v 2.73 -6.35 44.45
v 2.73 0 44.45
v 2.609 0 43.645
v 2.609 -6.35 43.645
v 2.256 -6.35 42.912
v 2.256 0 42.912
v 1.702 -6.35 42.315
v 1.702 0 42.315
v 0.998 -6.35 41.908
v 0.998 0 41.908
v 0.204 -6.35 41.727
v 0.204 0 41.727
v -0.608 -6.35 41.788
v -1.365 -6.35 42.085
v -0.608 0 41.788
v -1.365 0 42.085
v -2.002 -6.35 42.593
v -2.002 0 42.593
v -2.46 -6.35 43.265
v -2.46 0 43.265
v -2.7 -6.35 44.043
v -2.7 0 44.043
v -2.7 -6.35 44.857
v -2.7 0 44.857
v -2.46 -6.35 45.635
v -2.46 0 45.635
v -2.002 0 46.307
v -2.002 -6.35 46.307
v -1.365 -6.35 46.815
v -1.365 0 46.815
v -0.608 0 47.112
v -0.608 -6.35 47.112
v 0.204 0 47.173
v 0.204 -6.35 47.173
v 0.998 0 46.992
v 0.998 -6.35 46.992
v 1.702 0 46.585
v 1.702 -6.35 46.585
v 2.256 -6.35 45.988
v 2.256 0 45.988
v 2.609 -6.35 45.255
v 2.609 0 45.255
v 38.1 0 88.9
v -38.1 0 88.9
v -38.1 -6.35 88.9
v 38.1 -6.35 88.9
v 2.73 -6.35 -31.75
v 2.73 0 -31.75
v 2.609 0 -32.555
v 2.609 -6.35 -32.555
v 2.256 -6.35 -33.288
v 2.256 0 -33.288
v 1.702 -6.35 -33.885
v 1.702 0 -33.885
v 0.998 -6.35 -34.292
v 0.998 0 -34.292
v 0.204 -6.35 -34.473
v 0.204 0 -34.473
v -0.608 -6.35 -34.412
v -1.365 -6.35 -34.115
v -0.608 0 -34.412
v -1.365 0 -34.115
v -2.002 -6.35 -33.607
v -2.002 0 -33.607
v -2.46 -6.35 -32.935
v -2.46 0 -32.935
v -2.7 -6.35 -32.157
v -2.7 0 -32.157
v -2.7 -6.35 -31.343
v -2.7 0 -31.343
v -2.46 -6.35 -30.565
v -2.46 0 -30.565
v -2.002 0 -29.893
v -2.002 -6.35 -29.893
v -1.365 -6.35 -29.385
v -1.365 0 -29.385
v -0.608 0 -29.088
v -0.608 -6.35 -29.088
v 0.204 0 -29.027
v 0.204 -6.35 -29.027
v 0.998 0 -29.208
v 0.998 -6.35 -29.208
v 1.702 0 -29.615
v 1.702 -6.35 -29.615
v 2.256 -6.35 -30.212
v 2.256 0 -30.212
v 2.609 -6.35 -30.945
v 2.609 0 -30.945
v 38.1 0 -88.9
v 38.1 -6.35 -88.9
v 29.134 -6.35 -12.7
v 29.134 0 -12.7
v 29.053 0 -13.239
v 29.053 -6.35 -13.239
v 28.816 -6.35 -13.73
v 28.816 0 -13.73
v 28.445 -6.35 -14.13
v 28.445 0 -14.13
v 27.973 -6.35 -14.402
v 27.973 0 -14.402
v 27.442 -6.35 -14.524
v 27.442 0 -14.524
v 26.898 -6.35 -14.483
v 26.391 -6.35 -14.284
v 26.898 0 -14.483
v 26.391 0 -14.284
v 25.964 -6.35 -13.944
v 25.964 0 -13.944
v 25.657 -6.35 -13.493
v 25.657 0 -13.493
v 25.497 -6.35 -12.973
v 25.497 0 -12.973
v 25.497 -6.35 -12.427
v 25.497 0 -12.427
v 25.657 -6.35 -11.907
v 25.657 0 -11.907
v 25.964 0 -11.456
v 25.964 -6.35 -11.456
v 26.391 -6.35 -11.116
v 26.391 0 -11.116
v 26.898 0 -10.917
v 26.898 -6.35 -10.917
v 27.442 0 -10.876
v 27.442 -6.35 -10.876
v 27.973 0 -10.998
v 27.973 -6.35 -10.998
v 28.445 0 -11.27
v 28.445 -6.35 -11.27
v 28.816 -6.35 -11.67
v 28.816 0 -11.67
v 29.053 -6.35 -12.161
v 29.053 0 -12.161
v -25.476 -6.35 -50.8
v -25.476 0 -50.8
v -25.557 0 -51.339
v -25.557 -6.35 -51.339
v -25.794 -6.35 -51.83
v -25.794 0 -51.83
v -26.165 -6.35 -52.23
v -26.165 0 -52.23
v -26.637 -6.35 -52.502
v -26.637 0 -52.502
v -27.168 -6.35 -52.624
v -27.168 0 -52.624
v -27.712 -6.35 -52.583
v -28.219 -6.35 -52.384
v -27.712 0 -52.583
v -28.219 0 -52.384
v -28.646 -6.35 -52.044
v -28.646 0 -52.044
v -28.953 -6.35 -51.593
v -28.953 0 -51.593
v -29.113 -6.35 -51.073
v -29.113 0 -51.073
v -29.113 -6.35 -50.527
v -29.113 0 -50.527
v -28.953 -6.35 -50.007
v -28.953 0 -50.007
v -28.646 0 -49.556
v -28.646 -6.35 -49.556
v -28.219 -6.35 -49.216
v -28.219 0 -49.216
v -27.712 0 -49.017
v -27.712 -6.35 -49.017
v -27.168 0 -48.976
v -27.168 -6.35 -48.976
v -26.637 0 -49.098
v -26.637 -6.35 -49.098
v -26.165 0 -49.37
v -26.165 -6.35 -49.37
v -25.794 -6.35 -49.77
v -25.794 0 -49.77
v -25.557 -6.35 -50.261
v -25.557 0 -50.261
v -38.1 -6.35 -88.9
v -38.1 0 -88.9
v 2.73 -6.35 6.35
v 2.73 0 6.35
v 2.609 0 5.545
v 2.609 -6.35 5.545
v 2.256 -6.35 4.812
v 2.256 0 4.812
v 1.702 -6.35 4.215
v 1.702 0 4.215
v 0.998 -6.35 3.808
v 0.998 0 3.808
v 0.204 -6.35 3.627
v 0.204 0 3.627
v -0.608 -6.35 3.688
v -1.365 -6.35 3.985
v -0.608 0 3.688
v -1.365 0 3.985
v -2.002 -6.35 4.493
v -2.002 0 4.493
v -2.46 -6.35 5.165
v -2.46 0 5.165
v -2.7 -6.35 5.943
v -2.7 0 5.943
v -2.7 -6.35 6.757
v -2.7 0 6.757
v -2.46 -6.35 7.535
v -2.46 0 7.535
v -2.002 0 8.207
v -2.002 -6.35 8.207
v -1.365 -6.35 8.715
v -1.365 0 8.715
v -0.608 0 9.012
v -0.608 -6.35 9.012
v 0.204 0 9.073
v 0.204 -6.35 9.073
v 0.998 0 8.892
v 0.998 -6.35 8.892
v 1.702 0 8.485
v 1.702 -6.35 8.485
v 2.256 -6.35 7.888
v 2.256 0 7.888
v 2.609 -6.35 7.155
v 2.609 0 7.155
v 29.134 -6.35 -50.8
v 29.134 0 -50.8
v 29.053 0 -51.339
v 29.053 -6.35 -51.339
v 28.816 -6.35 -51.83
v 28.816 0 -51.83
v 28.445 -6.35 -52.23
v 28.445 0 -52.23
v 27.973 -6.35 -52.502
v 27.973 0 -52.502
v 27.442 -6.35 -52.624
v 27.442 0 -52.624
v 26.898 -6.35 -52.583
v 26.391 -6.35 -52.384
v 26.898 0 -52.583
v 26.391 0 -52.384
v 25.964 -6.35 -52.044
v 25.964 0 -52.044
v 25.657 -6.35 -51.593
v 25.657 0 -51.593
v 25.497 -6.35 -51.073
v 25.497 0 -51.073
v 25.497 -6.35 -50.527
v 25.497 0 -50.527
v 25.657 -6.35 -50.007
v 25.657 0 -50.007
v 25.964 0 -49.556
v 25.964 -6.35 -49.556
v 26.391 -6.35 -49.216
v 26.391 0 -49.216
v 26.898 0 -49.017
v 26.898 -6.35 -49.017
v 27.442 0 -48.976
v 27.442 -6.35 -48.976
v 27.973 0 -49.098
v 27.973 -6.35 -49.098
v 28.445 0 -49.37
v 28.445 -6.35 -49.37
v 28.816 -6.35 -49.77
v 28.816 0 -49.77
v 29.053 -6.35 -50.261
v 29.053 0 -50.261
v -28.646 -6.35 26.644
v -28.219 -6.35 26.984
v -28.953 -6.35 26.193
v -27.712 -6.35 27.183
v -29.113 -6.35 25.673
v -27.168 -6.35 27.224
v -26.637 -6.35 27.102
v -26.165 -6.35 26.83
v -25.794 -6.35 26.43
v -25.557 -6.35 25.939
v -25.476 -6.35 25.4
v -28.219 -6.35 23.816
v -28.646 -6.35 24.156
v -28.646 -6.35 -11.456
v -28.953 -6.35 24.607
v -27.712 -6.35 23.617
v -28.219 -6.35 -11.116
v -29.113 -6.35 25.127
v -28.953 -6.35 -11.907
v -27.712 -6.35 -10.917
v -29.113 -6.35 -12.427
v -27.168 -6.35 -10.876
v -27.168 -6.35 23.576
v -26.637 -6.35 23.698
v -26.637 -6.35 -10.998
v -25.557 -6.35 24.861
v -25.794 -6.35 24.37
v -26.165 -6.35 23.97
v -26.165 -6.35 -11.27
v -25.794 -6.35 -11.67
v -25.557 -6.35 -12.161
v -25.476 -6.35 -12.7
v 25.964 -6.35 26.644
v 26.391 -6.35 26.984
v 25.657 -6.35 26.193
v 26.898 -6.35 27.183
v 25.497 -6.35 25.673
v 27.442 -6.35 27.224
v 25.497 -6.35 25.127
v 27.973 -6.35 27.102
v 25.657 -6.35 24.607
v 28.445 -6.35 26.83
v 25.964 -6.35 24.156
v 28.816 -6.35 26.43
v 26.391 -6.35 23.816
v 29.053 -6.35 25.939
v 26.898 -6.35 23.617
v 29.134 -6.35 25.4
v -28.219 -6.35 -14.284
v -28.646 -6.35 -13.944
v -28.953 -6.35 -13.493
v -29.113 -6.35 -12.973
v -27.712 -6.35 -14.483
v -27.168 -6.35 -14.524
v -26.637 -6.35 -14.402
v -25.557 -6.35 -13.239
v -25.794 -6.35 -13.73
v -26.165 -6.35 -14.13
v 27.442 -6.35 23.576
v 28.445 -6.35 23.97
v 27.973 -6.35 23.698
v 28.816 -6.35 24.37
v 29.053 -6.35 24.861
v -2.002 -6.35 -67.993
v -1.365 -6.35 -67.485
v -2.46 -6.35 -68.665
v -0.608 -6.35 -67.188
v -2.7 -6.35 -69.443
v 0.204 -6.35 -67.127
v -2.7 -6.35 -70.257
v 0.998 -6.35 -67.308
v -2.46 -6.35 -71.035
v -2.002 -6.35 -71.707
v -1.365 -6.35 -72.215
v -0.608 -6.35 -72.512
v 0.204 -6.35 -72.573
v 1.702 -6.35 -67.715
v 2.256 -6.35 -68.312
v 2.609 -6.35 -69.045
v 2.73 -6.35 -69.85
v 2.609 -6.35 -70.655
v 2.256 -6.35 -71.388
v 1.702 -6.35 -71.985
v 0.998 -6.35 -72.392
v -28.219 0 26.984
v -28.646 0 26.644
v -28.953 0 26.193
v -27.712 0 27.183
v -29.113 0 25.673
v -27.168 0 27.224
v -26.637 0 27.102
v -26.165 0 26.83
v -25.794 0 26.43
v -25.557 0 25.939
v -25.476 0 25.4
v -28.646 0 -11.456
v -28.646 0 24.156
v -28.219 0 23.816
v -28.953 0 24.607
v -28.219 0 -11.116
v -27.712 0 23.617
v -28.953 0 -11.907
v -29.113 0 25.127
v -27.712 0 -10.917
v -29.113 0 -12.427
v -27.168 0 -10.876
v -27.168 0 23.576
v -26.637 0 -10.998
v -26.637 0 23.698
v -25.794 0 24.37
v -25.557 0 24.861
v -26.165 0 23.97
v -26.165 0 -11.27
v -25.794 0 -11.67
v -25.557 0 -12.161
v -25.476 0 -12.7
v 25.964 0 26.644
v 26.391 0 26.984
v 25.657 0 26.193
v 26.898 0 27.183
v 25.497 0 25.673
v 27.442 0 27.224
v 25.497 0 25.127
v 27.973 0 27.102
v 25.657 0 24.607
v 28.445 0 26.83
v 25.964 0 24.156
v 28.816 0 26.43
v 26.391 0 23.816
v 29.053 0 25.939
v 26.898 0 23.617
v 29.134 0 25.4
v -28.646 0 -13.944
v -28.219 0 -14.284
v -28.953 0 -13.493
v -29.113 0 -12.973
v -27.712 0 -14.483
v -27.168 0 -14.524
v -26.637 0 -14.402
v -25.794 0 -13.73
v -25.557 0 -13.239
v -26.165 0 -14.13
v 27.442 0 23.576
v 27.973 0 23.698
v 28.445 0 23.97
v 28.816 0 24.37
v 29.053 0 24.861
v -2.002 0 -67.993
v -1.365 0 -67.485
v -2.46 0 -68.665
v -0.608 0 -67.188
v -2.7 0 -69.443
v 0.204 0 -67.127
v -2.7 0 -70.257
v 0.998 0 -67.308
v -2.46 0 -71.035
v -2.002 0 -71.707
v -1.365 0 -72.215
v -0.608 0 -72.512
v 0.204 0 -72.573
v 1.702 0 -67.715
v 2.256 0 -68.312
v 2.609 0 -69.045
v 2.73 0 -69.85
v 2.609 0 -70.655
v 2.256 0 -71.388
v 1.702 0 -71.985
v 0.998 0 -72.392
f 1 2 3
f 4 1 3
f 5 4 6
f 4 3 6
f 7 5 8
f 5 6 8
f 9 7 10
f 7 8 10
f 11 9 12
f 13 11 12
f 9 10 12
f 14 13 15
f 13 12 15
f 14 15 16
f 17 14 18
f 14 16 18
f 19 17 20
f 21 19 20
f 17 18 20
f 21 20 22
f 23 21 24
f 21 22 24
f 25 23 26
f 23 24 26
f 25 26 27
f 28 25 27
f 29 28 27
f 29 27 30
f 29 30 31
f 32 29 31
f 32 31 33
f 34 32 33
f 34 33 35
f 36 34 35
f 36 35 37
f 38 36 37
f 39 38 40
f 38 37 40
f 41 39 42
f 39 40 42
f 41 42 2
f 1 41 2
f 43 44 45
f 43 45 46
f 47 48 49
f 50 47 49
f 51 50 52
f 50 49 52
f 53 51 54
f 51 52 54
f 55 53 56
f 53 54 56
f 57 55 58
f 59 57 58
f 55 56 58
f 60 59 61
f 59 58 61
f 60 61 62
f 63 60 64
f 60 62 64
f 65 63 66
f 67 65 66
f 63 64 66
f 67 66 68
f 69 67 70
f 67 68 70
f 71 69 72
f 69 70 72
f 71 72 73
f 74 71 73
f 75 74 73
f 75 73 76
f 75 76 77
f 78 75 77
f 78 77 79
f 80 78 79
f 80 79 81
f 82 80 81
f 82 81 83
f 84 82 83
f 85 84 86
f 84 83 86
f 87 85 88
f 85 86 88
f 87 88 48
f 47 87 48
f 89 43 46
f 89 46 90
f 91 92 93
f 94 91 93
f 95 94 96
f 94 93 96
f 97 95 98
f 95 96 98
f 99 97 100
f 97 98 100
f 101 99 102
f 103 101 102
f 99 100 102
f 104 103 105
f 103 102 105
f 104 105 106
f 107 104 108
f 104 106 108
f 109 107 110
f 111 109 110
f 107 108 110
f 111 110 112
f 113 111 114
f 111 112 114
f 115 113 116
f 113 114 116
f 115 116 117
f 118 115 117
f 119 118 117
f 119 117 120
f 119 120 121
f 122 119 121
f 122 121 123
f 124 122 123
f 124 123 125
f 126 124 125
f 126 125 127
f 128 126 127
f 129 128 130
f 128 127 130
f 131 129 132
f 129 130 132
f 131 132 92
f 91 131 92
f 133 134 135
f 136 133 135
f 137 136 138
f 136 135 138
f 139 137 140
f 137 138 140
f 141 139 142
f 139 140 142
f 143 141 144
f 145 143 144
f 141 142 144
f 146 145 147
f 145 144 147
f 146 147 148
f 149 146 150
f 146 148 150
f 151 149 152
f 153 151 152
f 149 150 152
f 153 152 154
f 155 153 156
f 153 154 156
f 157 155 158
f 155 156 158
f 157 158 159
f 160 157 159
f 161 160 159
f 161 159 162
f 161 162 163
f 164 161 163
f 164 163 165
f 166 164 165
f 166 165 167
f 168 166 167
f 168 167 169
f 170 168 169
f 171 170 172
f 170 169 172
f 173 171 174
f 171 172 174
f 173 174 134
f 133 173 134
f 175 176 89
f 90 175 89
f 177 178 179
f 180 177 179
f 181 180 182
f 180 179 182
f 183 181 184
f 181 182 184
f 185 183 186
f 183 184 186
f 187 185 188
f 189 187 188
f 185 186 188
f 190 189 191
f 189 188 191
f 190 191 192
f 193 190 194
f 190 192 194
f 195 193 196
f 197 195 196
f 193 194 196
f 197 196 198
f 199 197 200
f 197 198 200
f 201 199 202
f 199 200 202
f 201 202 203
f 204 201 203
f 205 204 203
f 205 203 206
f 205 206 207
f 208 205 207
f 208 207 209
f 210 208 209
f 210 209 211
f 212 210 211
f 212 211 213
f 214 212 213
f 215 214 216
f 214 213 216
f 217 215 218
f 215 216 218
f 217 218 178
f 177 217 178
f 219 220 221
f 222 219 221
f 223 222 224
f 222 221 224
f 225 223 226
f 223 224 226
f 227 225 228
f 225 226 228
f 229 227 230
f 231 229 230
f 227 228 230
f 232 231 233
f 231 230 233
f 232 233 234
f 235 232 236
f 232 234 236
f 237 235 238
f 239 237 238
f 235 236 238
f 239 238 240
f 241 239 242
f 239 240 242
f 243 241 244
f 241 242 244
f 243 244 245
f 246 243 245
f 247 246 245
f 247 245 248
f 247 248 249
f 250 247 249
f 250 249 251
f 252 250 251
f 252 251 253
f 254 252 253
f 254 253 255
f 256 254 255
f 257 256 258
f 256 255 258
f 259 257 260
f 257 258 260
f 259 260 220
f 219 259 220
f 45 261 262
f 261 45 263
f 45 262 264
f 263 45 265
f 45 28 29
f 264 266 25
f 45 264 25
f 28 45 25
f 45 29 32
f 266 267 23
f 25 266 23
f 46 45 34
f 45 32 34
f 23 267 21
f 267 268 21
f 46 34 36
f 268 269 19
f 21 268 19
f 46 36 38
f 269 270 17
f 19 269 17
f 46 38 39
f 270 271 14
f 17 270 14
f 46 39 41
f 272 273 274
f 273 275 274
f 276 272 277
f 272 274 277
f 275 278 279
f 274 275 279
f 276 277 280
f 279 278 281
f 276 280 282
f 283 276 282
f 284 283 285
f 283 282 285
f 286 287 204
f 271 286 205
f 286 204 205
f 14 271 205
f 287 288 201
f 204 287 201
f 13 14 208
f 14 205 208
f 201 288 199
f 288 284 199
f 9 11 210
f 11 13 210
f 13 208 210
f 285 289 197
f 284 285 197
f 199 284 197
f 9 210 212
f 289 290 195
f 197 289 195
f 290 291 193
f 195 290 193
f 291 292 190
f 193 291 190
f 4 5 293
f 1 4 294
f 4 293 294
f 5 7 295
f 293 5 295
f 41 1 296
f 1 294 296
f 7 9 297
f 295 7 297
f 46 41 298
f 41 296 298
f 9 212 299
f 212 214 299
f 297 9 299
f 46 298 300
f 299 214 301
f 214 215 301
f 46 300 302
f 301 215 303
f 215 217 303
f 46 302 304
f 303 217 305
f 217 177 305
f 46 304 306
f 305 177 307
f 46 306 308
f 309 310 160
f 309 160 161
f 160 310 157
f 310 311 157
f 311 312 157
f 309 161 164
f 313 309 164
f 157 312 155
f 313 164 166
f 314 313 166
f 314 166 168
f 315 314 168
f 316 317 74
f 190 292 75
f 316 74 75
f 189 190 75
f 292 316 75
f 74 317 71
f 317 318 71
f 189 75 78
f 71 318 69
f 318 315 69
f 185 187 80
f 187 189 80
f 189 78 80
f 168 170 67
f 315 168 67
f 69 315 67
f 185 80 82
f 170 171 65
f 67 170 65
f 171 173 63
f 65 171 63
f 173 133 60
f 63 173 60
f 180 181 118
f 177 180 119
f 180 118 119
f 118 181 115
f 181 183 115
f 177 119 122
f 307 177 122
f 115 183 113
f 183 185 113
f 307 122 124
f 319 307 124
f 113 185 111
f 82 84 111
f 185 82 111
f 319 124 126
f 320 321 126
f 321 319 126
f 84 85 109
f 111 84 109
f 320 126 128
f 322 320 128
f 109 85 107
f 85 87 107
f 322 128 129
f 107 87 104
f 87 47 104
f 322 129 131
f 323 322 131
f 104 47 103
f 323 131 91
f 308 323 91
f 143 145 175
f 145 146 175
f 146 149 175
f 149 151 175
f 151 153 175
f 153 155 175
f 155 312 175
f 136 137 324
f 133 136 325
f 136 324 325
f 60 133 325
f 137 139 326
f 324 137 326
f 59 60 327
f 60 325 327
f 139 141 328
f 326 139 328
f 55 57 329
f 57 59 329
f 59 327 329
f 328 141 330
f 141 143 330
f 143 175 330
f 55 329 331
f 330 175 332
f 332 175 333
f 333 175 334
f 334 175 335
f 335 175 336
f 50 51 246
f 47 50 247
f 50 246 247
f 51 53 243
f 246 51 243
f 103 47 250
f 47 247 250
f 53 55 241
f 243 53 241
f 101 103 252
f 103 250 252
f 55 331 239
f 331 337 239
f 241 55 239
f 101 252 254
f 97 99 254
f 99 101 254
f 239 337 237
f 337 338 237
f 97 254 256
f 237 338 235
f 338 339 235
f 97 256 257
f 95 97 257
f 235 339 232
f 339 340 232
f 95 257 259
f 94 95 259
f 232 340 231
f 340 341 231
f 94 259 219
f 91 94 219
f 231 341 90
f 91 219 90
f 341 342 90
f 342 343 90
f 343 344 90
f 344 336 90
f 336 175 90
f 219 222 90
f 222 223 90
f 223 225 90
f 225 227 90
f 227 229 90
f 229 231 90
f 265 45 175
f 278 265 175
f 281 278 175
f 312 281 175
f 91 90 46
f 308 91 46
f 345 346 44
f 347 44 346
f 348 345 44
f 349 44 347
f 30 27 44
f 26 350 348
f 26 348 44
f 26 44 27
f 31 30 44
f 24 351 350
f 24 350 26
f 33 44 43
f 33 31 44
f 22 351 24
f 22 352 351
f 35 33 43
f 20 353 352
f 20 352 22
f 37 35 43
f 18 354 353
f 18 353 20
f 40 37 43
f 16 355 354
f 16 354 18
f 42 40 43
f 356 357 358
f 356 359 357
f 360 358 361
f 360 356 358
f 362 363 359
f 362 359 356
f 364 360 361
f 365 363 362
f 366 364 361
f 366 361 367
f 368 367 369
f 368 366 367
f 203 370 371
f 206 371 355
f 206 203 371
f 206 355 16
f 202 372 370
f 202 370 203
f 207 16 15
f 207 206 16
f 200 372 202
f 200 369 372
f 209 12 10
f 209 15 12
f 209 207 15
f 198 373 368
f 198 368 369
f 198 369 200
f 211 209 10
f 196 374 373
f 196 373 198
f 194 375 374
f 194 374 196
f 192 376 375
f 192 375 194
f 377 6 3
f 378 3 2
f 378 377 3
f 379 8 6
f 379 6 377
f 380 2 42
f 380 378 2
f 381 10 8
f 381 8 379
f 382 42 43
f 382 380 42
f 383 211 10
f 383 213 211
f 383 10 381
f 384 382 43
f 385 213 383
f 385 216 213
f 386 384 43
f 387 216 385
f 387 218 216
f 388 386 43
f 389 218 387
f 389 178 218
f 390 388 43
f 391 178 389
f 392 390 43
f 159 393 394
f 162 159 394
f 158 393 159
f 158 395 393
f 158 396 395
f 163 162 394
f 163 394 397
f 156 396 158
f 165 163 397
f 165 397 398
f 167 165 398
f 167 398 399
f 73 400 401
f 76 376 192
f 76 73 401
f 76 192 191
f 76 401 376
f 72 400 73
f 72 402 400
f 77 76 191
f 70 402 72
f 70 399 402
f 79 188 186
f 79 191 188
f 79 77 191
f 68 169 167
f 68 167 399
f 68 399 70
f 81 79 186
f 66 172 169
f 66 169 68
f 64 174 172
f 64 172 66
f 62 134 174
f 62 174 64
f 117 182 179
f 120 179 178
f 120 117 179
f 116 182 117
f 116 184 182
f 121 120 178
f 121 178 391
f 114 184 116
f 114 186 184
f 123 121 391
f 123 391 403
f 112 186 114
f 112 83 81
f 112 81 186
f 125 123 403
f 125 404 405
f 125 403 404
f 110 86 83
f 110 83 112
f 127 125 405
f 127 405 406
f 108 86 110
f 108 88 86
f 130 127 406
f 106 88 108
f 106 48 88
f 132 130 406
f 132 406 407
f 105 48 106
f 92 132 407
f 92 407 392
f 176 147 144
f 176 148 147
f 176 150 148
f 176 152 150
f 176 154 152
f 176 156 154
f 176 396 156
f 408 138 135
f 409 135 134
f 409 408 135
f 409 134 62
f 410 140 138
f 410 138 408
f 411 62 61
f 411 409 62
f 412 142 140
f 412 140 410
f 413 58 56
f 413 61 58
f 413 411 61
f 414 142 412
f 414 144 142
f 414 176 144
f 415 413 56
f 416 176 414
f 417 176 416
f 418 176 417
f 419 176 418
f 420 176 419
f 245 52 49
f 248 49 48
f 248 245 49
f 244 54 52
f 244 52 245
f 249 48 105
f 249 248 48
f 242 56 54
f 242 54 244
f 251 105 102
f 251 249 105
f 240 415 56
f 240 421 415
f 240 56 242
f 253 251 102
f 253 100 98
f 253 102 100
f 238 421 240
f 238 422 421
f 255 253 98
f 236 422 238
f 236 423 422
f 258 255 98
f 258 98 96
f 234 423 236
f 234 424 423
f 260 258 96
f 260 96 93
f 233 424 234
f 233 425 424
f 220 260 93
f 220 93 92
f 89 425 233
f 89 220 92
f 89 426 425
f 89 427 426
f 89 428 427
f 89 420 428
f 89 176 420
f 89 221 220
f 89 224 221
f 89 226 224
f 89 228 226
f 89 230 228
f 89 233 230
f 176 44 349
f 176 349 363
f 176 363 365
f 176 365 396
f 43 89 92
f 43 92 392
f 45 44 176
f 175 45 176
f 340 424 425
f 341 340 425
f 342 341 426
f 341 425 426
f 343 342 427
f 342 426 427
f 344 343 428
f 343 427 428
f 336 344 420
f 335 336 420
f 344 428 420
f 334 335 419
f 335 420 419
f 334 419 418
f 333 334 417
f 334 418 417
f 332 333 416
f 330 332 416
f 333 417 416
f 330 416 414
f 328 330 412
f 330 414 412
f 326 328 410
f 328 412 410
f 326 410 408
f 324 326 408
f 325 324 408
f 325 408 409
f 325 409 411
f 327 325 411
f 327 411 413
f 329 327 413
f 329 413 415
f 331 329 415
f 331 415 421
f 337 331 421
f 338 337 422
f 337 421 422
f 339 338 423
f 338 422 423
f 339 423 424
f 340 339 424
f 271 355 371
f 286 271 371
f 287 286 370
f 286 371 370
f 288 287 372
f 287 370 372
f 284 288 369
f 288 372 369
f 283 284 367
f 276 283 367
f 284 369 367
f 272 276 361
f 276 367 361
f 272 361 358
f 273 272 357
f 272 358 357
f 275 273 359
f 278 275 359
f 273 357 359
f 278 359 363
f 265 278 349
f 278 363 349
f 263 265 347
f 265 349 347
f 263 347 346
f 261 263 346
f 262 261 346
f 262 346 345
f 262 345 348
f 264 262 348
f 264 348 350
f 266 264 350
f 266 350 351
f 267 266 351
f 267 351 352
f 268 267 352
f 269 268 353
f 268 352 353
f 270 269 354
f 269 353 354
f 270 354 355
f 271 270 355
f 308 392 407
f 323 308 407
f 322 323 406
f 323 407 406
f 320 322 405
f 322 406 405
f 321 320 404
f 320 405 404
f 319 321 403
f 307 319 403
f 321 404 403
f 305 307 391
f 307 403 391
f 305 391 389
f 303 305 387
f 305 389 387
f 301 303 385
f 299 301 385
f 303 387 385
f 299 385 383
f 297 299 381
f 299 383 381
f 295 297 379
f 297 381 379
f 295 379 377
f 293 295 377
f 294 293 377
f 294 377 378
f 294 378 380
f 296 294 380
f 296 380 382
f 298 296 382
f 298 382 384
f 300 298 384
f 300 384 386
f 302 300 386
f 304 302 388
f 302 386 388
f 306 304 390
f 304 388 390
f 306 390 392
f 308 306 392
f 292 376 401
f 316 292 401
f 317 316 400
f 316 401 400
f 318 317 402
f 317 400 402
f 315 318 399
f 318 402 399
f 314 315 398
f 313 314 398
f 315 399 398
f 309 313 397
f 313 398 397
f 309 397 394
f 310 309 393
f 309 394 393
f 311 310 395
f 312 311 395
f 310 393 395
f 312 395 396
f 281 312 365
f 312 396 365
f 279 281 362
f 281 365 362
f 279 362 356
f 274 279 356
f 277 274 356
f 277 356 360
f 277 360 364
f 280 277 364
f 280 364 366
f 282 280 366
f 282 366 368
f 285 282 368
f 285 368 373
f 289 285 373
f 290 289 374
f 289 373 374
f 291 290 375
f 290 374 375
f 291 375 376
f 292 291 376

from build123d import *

# Parameters (mm, degrees)
SKETCH1_W           = 76.2
SKETCH1_H           = 177.8
SKETCH1_R           = 2.7305
SKETCH1_R_2         = 1.8288
BOSS_EXTRUDE1_DEPTH = 6.35


with BuildPart() as part:
    # Sketch1 → Boss-Extrude1 (new body)
    with BuildSketch(Plane(origin=(0, 0, 0), x_dir=(1, 0, 0), z_dir=(0, 1, 0))):
        Rectangle(SKETCH1_W, SKETCH1_H)
        with Locations((0, 69.85)):
            Circle(SKETCH1_R, mode=Mode.SUBTRACT)
        with Locations((0, 31.75)):
            Circle(SKETCH1_R, mode=Mode.SUBTRACT)
        with Locations((0, -6.35)):
            Circle(SKETCH1_R, mode=Mode.SUBTRACT)
        with Locations((0, -44.45)):
            Circle(SKETCH1_R, mode=Mode.SUBTRACT)
        with Locations((27.305, 50.8)):
            Circle(SKETCH1_R_2, mode=Mode.SUBTRACT)
        with Locations((27.305, 12.7)):
            Circle(SKETCH1_R_2, mode=Mode.SUBTRACT)
        with Locations((27.305, -25.4)):
            Circle(SKETCH1_R_2, mode=Mode.SUBTRACT)
        with Locations((-27.305, 12.7)):
            Circle(SKETCH1_R_2, mode=Mode.SUBTRACT)
        with Locations((-27.305, -25.4)):
            Circle(SKETCH1_R_2, mode=Mode.SUBTRACT)
        with Locations((-27.305, 50.8)):
            Circle(SKETCH1_R_2, mode=Mode.SUBTRACT)
    extrude(amount=-BOSS_EXTRUDE1_DEPTH)


solid = part.part
